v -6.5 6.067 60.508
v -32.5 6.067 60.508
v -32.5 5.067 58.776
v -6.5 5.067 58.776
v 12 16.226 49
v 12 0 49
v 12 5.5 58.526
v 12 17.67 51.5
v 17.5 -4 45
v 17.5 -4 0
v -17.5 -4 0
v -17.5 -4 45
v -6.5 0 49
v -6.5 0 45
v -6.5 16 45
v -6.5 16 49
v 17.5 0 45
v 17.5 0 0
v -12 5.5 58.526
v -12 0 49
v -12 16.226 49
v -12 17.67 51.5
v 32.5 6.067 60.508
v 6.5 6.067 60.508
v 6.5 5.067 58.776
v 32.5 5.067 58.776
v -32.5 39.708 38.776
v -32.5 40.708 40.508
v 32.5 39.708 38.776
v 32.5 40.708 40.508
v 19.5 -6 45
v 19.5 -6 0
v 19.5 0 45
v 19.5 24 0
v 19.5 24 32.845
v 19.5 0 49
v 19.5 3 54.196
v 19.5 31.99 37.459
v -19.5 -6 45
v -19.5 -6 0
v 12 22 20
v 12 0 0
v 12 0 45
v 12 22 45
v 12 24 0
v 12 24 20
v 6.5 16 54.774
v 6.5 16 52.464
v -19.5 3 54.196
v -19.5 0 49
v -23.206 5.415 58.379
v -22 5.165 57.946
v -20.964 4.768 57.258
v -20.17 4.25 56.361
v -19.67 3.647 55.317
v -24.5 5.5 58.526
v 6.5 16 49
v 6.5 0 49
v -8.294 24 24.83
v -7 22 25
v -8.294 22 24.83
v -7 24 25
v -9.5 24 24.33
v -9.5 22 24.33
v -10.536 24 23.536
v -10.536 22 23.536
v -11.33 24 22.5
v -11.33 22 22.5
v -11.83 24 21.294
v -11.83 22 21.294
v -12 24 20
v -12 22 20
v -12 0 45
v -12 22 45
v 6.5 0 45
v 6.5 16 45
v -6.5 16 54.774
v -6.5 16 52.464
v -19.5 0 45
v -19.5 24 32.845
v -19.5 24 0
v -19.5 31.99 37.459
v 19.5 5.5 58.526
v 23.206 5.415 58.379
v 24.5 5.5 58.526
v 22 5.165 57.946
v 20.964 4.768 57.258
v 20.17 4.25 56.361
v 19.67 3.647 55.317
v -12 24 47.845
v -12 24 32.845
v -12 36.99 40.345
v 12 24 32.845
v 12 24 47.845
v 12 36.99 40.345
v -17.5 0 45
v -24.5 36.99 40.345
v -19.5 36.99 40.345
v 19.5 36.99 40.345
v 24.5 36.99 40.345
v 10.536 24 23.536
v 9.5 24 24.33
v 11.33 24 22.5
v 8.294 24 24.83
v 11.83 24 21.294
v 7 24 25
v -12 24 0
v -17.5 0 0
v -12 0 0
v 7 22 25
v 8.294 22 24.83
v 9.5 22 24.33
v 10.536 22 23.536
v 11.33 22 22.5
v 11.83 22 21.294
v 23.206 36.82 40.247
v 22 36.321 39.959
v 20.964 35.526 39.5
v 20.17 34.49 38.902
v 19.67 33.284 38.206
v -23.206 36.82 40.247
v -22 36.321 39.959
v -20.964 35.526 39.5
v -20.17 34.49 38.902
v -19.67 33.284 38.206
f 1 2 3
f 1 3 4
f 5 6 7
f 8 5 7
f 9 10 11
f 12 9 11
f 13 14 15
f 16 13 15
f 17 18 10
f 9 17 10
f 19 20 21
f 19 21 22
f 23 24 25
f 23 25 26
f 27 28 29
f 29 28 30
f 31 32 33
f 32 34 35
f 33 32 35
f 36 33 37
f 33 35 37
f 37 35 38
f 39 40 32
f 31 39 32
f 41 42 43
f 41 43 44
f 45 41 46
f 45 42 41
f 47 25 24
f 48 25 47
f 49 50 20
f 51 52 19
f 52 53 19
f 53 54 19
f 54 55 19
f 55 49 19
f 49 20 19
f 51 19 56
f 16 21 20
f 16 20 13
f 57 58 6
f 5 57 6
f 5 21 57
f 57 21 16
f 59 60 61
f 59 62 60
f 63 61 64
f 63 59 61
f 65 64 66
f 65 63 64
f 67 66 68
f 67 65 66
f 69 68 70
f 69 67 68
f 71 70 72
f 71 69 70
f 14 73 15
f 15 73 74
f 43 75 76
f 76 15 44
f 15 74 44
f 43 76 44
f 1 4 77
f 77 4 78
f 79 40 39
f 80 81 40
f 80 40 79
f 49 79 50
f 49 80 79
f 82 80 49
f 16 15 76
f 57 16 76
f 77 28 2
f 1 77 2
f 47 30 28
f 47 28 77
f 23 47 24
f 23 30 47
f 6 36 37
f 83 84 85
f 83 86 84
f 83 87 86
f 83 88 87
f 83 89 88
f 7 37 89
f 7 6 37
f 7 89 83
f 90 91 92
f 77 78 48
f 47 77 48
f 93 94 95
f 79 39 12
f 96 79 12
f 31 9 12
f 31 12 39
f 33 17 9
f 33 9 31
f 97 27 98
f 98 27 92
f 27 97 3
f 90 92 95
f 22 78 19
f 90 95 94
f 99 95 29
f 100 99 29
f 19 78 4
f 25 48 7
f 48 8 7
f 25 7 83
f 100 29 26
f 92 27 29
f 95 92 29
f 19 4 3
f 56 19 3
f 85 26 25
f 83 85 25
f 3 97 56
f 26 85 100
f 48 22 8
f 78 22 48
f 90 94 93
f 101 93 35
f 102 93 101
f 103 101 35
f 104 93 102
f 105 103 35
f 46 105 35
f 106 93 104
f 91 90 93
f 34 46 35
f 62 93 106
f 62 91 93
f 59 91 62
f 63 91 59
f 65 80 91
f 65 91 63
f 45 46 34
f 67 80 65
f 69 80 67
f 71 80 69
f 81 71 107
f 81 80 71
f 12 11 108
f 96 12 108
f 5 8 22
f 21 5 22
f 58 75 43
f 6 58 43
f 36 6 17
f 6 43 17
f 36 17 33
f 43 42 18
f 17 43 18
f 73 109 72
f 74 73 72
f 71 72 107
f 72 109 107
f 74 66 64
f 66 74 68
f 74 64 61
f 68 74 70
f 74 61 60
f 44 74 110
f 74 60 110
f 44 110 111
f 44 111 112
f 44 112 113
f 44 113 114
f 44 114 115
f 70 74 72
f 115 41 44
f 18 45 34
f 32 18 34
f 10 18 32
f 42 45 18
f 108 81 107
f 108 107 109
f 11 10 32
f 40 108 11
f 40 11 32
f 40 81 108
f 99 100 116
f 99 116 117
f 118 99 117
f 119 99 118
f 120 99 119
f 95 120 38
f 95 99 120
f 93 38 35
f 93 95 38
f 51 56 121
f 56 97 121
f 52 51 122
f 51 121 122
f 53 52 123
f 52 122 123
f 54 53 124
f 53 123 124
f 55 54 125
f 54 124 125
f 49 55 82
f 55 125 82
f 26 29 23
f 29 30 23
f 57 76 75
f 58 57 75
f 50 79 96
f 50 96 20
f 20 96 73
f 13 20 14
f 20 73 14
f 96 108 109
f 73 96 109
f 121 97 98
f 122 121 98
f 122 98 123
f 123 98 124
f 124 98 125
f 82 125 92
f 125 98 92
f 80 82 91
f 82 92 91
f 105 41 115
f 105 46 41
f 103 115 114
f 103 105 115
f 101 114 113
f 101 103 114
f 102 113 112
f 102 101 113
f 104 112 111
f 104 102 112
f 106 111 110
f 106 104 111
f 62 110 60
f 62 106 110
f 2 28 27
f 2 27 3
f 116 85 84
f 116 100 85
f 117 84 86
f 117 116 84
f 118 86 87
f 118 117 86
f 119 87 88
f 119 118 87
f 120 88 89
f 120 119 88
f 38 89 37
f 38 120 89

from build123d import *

# Parameters (mm, degrees)
EXTRUDE_1_DEPTH          = 45
EXTRUDE_2_DEPTH          = 4
SKETCH_3_W               = 24
SKETCH_3_H               = 2
CUT_EXTRUDE_1_DEPTH      = 25
SKETCH_5_W               = 40
SKETCH_5_H               = 65
EXTRUDE_3_DEPTH          = 1
CUT_EXTRUDE_2_DEPTH      = 72.51497427
CUT_EXTRUDE_2_DEPTH_BACK = 72.51497427
SKETCH_6_W               = 13
SKETCH_6_H               = 16
EXTRUDE_6_DEPTH          = 2
EXTRUDE_7_DEPTH          = 2
EXTRUDE_8_DEPTH          = 2
EXTRUDE_9_DEPTH          = 2
FILLET_1_R               = 5
EXTRUDE_10_DEPTH         = 5.5
EXTRUDE_11_DEPTH         = 5.5
SKETCH_18_W              = 24
SKETCH_18_H              = 5
EXTRUDE_13_DEPTH         = 3
FILLET_2_R               = 5


with BuildPart() as part:
    # ｽｹｯﾁ1 → ﾎﾞｽ - 押し出し1 (new body)
    with BuildSketch(Plane.XY):
        Polygon((-14, 24), (-14, 2), (-19.5, 2), (-19.5, -6), (19.5, -6), (19.5, 2), (14, 2), (14, 24), align=None)
        Polygon((-12, 0), (-12, 22), (12, 22), (12, 0), (17.5, 0), (17.5, -4), (-17.5, -4), (-17.5, 0), align=None, mode=Mode.SUBTRACT)
    extrude(amount=EXTRUDE_1_DEPTH)

    # ｽｹｯﾁ2 → ﾎﾞｽ - 押し出し2 (add)
    with BuildSketch(Plane.XY.offset(45)):
        Polygon((-14, 24), (-14, 0), (-6.5, 0), (-6.5, 16), (6.5, 16), (6.5, 0), (14, 0), (14, 24), align=None)
    extrude(amount=EXTRUDE_2_DEPTH)

    # ｽｹｯﾁ3 → ｶｯﾄ - 押し出し1 (cut)
    with BuildSketch(Plane(origin=(0, 0, 0), x_dir=(-1, 0, 0), z_dir=(0, 0, -1))):
        with Locations((0, 23)):
            Rectangle(SKETCH_3_W, SKETCH_3_H)
    extrude(amount=-CUT_EXTRUDE_1_DEPTH, mode=Mode.SUBTRACT)



with BuildPart() as body_2:
    # ｽｹｯﾁ5 → ﾎﾞｽ - 押し出し3 (new, symmetric)
    with BuildSketch(Plane(origin=(0, 27.217622393, 47.142304845), x_dir=(0, -0.8660254037844413, 0.4999999999999954), z_dir=(0, 0.4999999999999954, 0.8660254037844413))):
        with Locations((5, 0)):
            Rectangle(SKETCH_5_W, SKETCH_5_H)
    extrude(amount=EXTRUDE_3_DEPTH, both=True)

    # ｽｹｯﾁ6 → ｶｯﾄ - 押し出し2 (cut, two sides: drawn at the far end of the back side and taken through both)
    with BuildSketch(Plane.XY.offset(49).offset(-CUT_EXTRUDE_2_DEPTH_BACK)):
        with Locations((0, 8)):
            Rectangle(SKETCH_6_W, SKETCH_6_H)
    extrude(amount=CUT_EXTRUDE_2_DEPTH + CUT_EXTRUDE_2_DEPTH_BACK, mode=Mode.SUBTRACT)


with BuildPart() as part_1:
    add(part.part)

    add(body_2.part)  # ﾎﾞｽ - 押し出し6 merges body 2
    # ｽｹｯﾁ11 → ﾎﾞｽ - 押し出し6 (add)
    with BuildSketch(Plane.ZY.offset(14)):
        Polygon((40.345299462, 36.990381057), (32.845299462, 24), (47.845299462, 24), align=None)
    extrude(amount=-EXTRUDE_6_DEPTH)

    # ｽｹｯﾁ12 → ﾎﾞｽ - 押し出し7 (add)
    with BuildSketch(Plane(origin=(14, 0, 0), x_dir=(0, 0, -1), z_dir=(1, 0, 0))):
        Polygon((-47.845299462, 24), (-32.845299462, 24), (-40.345299462, 36.990381057), align=None)
    extrude(amount=-EXTRUDE_7_DEPTH)

    # ｽｹｯﾁ13 → ﾎﾞｽ - 押し出し8 (add)
    with BuildSketch(Plane.ZY.offset(14)):
        Polygon((49, 22), (49, 0), (58.526279442, 5.5), align=None)
    extrude(amount=-EXTRUDE_8_DEPTH)

    # ｽｹｯﾁ14 → ﾎﾞｽ - 押し出し9 (add)
    with BuildSketch(Plane(origin=(14, 0, 0), x_dir=(0, 0, -1), z_dir=(1, 0, 0))):
        Polygon((-49, 22), (-49, 0), (-58.526279442, 5.5), align=None)
    extrude(amount=-EXTRUDE_9_DEPTH)

    # ﾌｨﾚｯﾄ1
    fillet_1_edges = [part_1.edges().sort_by_distance(p)[0] for p in [
        (12, 23, 25),
        (-12, 23, 25),
    ]]
    fillet(fillet_1_edges, radius=FILLET_1_R)

    # ｽｹｯﾁ16 → ﾎﾞｽ - 押し出し10 (add)
    with BuildSketch(Plane.ZY.offset(14)):
        Polygon((0, 24), (0, 2), (45, 2), (45, 0), (49, 0), (58.526279442, 5.5), (40.345299462, 36.990381057), (32.845299462, 24), align=None)
    extrude(amount=EXTRUDE_10_DEPTH)

    # ｽｹｯﾁ17 → ﾎﾞｽ - 押し出し11 (add)
    with BuildSketch(Plane(origin=(14, 0, 0), x_dir=(0, 0, -1), z_dir=(1, 0, 0))):
        Polygon((0, 24), (0, 2), (-45, 2), (-45, 0), (-49, 0), (-58.526279442, 5.5), (-40.345299462, 36.990381057), (-32.845299462, 24), align=None)
    extrude(amount=EXTRUDE_11_DEPTH)

    # ｽｹｯﾁ18 → ﾎﾞｽ - 押し出し13 (add)
    with BuildSketch(Plane(origin=(0, 26.717622393, 46.276279442), x_dir=(-1, 0, 0), z_dir=(0, -0.4999999999999954, -0.8660254037844414))):
        with Locations((0, -7.947441117)):
            Rectangle(SKETCH_18_W, SKETCH_18_H)
    extrude(amount=EXTRUDE_13_DEPTH)

    # ﾌｨﾚｯﾄ2
    fillet_2_edges = [part_1.edges().sort_by_distance(p)[0] for p in [
        (-19.5, 21.245190528, 49.435789452),
        (19.5, 21.245190528, 49.435789452),
    ]]
    fillet(fillet_2_edges, radius=FILLET_2_R)


solid = part_1.part
